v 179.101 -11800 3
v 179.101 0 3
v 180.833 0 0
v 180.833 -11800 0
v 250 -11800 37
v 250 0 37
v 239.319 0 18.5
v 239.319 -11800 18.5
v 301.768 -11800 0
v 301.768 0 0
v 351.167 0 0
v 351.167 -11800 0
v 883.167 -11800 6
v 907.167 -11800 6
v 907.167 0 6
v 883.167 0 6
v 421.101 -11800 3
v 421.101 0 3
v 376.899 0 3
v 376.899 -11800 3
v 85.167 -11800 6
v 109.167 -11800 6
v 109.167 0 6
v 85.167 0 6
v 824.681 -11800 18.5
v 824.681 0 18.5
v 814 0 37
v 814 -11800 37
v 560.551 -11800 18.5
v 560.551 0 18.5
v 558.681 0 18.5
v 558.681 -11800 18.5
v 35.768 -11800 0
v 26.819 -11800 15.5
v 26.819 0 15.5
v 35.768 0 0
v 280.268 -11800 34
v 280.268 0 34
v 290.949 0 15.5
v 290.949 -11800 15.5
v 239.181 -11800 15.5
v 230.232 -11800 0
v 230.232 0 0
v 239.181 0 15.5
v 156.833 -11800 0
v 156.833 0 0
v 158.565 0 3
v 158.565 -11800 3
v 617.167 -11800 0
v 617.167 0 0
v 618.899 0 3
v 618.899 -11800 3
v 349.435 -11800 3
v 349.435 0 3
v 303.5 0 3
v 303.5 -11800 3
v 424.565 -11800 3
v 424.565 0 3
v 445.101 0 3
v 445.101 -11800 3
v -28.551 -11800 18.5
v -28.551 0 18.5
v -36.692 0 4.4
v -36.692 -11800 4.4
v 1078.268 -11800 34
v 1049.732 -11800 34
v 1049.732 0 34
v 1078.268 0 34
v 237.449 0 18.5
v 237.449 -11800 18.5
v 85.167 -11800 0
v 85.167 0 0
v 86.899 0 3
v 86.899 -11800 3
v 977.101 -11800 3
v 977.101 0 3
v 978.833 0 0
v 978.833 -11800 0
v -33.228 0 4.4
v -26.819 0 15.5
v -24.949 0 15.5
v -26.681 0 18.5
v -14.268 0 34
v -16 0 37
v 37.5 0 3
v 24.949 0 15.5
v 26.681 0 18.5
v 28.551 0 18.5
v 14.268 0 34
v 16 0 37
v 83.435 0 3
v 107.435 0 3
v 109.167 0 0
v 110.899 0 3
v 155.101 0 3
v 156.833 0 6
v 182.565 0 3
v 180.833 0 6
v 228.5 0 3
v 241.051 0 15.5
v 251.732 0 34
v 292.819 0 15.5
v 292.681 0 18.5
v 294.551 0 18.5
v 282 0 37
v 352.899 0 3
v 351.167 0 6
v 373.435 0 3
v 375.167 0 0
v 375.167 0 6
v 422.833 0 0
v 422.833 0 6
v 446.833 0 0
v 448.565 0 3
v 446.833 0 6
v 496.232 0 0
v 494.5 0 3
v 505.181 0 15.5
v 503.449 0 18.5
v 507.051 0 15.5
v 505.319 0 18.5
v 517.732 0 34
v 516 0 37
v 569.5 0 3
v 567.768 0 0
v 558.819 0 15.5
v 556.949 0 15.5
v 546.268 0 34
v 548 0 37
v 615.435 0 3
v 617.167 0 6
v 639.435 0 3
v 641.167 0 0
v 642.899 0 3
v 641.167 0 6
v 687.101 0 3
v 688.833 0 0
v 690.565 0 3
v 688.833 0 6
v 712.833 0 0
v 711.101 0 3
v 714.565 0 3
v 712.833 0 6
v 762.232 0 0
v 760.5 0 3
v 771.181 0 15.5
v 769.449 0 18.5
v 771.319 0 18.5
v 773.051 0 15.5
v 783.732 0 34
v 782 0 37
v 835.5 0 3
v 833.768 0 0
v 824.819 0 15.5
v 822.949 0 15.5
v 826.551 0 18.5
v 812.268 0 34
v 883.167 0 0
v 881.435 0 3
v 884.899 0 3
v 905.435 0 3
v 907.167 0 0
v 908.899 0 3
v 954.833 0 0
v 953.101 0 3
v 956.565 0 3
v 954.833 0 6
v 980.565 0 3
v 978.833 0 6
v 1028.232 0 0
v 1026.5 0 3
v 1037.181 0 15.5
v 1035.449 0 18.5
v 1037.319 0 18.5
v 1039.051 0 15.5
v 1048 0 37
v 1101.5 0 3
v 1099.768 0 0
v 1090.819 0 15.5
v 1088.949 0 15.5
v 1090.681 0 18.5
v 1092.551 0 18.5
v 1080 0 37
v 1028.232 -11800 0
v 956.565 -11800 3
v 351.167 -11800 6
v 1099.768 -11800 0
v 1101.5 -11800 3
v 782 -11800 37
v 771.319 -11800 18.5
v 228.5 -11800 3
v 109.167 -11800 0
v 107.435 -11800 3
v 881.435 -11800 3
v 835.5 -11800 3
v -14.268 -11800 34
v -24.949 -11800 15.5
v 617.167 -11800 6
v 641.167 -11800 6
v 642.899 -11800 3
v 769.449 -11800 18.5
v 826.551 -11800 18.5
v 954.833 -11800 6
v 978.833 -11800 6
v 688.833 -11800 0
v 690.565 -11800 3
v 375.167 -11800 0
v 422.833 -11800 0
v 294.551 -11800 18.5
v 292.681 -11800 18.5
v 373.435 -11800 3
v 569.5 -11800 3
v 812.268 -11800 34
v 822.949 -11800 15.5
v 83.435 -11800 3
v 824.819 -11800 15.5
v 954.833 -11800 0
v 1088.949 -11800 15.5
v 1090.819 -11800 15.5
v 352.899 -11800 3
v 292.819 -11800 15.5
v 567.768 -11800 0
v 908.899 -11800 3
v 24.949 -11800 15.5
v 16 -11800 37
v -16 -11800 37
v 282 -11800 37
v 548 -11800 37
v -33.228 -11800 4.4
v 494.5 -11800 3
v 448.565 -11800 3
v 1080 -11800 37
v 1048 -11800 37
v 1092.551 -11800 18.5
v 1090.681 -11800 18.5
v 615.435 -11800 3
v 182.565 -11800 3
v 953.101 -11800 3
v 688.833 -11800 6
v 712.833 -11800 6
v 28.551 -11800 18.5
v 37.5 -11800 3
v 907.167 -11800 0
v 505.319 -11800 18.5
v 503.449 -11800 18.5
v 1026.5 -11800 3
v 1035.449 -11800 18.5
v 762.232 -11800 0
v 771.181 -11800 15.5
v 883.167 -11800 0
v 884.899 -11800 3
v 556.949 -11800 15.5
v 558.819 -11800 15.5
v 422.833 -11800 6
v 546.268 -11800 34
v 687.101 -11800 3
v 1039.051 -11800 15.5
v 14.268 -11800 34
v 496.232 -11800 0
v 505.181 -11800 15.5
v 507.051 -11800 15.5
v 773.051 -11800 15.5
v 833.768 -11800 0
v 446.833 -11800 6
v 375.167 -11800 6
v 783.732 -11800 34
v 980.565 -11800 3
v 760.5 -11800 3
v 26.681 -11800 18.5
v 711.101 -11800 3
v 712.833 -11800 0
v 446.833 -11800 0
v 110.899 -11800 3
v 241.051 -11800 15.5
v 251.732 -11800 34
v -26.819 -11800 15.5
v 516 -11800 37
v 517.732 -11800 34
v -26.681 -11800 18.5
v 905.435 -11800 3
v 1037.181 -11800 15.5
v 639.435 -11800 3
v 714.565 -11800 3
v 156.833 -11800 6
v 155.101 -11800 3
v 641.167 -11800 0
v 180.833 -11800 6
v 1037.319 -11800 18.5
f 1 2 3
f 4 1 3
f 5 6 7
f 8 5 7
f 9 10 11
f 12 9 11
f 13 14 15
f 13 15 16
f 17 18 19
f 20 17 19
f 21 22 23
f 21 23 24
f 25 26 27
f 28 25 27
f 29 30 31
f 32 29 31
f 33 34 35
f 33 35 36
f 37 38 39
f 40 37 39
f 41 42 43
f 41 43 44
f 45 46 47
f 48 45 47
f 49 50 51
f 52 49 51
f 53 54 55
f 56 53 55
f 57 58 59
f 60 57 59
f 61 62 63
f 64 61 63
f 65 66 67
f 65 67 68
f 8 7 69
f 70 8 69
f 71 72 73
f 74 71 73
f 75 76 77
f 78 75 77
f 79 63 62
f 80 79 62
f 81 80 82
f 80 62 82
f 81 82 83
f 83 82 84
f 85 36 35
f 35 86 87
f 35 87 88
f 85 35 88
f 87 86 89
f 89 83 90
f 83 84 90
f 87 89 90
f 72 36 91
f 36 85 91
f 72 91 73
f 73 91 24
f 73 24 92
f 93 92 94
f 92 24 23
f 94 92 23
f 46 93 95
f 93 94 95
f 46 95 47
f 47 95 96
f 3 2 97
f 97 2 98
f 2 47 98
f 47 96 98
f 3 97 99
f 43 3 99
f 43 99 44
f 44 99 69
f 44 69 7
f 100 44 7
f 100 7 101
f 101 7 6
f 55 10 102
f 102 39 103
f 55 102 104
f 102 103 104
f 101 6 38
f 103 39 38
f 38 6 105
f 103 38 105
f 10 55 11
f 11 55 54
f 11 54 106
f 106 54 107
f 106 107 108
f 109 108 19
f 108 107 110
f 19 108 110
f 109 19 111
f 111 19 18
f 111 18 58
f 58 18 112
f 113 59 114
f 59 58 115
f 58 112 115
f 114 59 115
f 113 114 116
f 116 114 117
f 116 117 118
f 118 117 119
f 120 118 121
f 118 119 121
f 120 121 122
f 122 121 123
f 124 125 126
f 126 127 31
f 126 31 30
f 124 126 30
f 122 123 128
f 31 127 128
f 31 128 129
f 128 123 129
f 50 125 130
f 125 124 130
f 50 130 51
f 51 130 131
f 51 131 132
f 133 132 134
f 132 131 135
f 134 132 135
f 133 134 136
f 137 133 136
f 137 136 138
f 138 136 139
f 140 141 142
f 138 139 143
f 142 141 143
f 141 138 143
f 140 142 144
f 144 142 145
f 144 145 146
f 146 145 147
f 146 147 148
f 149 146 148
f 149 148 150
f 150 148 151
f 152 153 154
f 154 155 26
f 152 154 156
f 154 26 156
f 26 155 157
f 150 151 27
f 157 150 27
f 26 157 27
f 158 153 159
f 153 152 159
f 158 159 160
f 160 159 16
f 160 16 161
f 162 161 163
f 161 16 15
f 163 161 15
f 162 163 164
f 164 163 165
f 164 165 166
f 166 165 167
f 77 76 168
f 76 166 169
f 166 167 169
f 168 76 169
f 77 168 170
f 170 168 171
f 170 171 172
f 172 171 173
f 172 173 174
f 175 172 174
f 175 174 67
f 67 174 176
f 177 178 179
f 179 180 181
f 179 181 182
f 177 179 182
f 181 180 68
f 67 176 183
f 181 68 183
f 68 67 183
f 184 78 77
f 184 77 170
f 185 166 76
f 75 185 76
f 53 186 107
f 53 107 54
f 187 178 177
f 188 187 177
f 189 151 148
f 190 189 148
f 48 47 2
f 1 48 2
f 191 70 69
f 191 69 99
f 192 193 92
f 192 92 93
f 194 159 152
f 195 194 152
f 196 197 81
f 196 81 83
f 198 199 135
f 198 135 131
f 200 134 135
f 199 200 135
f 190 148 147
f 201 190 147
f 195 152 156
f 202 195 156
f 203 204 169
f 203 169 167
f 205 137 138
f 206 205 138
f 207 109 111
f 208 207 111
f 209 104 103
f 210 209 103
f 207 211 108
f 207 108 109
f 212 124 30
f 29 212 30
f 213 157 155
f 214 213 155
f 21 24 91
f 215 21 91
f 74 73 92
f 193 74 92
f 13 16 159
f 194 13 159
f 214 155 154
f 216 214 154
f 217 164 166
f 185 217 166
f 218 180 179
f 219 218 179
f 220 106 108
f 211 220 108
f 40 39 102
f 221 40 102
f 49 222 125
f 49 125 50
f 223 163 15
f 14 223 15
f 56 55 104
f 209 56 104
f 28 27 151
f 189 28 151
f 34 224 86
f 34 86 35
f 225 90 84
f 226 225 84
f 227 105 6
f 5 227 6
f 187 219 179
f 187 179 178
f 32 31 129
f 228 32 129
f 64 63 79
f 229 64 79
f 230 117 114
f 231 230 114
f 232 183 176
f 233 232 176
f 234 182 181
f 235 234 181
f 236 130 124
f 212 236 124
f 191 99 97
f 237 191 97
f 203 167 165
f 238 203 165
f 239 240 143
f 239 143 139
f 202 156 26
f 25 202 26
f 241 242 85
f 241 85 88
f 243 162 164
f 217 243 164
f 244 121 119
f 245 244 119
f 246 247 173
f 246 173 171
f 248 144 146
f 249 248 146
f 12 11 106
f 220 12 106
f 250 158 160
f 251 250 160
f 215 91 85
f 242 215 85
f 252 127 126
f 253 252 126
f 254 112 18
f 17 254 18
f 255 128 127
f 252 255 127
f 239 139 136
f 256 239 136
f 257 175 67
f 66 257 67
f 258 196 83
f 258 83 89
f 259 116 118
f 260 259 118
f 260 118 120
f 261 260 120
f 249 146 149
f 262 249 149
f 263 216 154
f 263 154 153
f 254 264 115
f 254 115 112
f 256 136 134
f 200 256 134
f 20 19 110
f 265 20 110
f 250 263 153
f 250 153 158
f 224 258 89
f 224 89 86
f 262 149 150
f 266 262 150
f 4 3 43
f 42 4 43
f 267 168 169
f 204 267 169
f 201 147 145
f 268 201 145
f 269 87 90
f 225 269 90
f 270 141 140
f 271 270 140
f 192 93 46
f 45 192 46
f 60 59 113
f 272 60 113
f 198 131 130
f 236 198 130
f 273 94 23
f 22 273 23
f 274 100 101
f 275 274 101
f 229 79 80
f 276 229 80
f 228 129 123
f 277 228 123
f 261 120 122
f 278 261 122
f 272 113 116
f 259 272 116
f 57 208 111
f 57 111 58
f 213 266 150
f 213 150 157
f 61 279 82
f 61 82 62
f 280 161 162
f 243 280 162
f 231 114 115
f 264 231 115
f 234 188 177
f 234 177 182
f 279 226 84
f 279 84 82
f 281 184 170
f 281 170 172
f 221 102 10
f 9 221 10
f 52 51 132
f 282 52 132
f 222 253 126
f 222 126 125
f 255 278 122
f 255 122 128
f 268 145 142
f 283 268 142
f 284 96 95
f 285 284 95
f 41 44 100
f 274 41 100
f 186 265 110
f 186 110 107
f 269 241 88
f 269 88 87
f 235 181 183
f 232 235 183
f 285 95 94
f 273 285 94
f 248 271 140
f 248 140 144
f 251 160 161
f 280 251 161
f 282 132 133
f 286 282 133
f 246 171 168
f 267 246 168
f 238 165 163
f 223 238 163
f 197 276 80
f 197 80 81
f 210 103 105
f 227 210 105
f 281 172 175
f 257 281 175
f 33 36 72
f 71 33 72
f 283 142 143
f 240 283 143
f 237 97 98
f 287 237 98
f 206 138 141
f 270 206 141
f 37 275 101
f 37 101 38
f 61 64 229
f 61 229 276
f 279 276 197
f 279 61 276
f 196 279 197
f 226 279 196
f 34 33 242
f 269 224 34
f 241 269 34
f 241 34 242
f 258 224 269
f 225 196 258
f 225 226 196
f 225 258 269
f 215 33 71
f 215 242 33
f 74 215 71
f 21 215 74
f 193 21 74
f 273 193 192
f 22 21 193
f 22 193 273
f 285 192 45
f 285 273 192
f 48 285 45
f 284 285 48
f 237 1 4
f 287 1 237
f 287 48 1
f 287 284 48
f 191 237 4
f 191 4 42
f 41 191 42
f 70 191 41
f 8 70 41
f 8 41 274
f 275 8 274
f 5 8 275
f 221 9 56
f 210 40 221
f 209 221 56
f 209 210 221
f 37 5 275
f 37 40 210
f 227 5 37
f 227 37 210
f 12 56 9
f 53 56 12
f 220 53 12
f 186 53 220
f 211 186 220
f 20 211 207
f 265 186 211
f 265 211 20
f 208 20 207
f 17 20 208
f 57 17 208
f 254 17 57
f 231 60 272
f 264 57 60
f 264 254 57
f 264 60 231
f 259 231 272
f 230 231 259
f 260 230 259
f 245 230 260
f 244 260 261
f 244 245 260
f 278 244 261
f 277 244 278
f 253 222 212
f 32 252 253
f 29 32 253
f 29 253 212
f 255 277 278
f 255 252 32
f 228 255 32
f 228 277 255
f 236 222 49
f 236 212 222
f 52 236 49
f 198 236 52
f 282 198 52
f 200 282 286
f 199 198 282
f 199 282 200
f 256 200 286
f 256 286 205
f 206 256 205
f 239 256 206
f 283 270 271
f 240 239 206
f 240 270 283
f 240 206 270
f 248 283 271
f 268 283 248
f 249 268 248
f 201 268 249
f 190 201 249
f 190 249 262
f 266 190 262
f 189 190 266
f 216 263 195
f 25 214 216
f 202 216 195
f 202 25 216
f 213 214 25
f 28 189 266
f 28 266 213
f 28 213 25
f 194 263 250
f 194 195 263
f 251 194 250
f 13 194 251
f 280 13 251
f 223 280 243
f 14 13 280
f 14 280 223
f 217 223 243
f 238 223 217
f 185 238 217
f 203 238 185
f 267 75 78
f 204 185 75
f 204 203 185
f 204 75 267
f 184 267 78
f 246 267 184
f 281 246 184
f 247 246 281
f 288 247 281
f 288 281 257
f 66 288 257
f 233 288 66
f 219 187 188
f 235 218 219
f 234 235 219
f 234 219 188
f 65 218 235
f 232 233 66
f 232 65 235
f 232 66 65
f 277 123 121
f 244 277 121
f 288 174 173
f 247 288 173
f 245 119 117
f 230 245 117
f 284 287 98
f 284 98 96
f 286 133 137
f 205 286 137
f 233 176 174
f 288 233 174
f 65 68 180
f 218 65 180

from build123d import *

# Parameters (mm, degrees)
F2_DEPTH = 11800


with BuildPart() as f2:
    # F1 (on Front) → F2 (new body)
    with BuildSketch(Plane.XZ):
        Polygon((-36.69171, 4.4), (-33.227608, 4.4), (-26.81902, 15.5), (-24.948929, 15.5), (-14.267949, 34), (14.267949, 34), (24.948929, 15.5), (26.81902, 15.5), (35.767949, 0), (85.166667, 0), (86.898717, 3), (107.434616, 3), (109.166667, 0), (156.833333, 0), (158.565384, 3), (179.101283, 3), (180.833333, 0), (230.232051, 0), (239.18098, 15.5), (241.051071, 15.5), (251.732051, 34), (280.267949, 34), (290.948929, 15.5), (292.81902, 15.5), (301.767949, 0), (351.166667, 0), (352.898717, 3), (373.434616, 3), (375.166667, 0), (422.833333, 0), (424.565384, 3), (445.101283, 3), (446.833333, 0), (496.232051, 0), (505.18098, 15.5), (507.051071, 15.5), (517.732051, 34), (546.267949, 34), (556.948929, 15.5), (558.81902, 15.5), (567.767949, 0), (617.166667, 0), (618.898717, 3), (639.434616, 3), (641.166667, 0), (688.833333, 0), (690.565384, 3), (711.101283, 3), (712.833333, 0), (762.232051, 0), (771.18098, 15.5), (773.051071, 15.5), (783.732051, 34), (812.267949, 34), (822.948929, 15.5), (824.81902, 15.5), (833.767949, 0), (883.166667, 0), (884.898717, 3), (905.434616, 3), (907.166667, 0), (954.833333, 0), (956.565384, 3), (977.101283, 3), (978.833333, 0), (1028.232051, 0), (1037.18098, 15.5), (1039.051071, 15.5), (1049.732051, 34), (1078.267949, 34), (1088.948929, 15.5), (1090.81902, 15.5), (1099.767949, 0), (1101.5, 3), (1092.551071, 18.5), (1090.68098, 18.5), (1080, 37), (1048, 37), (1037.31902, 18.5), (1035.448929, 18.5), (1026.5, 3), (980.565384, 3), (978.833333, 6), (954.833333, 6), (953.101283, 3), (908.898717, 3), (907.166667, 6), (883.166667, 6), (881.434616, 3), (835.5, 3), (826.551071, 18.5), (824.68098, 18.5), (814, 37), (782, 37), (771.31902, 18.5), (769.448929, 18.5), (760.5, 3), (714.565384, 3), (712.833333, 6), (688.833333, 6), (687.101283, 3), (642.898717, 3), (641.166667, 6), (617.166667, 6), (615.434616, 3), (569.5, 3), (560.551071, 18.5), (558.68098, 18.5), (548, 37), (516, 37), (505.31902, 18.5), (503.448929, 18.5), (494.5, 3), (448.565384, 3), (446.833333, 6), (422.833333, 6), (421.101283, 3), (376.898717, 3), (375.166667, 6), (351.166667, 6), (349.434616, 3), (303.5, 3), (294.551071, 18.5), (292.68098, 18.5), (282, 37), (250, 37), (239.31902, 18.5), (237.448929, 18.5), (228.5, 3), (182.565384, 3), (180.833333, 6), (156.833333, 6), (155.101283, 3), (110.898717, 3), (109.166667, 6), (85.166667, 6), (83.434616, 3), (37.5, 3), (28.551071, 18.5), (26.68098, 18.5), (16, 37), (-16, 37), (-26.68098, 18.5), (-28.551071, 18.5), align=None)
    extrude(amount=F2_DEPTH)


solid = f2.part
